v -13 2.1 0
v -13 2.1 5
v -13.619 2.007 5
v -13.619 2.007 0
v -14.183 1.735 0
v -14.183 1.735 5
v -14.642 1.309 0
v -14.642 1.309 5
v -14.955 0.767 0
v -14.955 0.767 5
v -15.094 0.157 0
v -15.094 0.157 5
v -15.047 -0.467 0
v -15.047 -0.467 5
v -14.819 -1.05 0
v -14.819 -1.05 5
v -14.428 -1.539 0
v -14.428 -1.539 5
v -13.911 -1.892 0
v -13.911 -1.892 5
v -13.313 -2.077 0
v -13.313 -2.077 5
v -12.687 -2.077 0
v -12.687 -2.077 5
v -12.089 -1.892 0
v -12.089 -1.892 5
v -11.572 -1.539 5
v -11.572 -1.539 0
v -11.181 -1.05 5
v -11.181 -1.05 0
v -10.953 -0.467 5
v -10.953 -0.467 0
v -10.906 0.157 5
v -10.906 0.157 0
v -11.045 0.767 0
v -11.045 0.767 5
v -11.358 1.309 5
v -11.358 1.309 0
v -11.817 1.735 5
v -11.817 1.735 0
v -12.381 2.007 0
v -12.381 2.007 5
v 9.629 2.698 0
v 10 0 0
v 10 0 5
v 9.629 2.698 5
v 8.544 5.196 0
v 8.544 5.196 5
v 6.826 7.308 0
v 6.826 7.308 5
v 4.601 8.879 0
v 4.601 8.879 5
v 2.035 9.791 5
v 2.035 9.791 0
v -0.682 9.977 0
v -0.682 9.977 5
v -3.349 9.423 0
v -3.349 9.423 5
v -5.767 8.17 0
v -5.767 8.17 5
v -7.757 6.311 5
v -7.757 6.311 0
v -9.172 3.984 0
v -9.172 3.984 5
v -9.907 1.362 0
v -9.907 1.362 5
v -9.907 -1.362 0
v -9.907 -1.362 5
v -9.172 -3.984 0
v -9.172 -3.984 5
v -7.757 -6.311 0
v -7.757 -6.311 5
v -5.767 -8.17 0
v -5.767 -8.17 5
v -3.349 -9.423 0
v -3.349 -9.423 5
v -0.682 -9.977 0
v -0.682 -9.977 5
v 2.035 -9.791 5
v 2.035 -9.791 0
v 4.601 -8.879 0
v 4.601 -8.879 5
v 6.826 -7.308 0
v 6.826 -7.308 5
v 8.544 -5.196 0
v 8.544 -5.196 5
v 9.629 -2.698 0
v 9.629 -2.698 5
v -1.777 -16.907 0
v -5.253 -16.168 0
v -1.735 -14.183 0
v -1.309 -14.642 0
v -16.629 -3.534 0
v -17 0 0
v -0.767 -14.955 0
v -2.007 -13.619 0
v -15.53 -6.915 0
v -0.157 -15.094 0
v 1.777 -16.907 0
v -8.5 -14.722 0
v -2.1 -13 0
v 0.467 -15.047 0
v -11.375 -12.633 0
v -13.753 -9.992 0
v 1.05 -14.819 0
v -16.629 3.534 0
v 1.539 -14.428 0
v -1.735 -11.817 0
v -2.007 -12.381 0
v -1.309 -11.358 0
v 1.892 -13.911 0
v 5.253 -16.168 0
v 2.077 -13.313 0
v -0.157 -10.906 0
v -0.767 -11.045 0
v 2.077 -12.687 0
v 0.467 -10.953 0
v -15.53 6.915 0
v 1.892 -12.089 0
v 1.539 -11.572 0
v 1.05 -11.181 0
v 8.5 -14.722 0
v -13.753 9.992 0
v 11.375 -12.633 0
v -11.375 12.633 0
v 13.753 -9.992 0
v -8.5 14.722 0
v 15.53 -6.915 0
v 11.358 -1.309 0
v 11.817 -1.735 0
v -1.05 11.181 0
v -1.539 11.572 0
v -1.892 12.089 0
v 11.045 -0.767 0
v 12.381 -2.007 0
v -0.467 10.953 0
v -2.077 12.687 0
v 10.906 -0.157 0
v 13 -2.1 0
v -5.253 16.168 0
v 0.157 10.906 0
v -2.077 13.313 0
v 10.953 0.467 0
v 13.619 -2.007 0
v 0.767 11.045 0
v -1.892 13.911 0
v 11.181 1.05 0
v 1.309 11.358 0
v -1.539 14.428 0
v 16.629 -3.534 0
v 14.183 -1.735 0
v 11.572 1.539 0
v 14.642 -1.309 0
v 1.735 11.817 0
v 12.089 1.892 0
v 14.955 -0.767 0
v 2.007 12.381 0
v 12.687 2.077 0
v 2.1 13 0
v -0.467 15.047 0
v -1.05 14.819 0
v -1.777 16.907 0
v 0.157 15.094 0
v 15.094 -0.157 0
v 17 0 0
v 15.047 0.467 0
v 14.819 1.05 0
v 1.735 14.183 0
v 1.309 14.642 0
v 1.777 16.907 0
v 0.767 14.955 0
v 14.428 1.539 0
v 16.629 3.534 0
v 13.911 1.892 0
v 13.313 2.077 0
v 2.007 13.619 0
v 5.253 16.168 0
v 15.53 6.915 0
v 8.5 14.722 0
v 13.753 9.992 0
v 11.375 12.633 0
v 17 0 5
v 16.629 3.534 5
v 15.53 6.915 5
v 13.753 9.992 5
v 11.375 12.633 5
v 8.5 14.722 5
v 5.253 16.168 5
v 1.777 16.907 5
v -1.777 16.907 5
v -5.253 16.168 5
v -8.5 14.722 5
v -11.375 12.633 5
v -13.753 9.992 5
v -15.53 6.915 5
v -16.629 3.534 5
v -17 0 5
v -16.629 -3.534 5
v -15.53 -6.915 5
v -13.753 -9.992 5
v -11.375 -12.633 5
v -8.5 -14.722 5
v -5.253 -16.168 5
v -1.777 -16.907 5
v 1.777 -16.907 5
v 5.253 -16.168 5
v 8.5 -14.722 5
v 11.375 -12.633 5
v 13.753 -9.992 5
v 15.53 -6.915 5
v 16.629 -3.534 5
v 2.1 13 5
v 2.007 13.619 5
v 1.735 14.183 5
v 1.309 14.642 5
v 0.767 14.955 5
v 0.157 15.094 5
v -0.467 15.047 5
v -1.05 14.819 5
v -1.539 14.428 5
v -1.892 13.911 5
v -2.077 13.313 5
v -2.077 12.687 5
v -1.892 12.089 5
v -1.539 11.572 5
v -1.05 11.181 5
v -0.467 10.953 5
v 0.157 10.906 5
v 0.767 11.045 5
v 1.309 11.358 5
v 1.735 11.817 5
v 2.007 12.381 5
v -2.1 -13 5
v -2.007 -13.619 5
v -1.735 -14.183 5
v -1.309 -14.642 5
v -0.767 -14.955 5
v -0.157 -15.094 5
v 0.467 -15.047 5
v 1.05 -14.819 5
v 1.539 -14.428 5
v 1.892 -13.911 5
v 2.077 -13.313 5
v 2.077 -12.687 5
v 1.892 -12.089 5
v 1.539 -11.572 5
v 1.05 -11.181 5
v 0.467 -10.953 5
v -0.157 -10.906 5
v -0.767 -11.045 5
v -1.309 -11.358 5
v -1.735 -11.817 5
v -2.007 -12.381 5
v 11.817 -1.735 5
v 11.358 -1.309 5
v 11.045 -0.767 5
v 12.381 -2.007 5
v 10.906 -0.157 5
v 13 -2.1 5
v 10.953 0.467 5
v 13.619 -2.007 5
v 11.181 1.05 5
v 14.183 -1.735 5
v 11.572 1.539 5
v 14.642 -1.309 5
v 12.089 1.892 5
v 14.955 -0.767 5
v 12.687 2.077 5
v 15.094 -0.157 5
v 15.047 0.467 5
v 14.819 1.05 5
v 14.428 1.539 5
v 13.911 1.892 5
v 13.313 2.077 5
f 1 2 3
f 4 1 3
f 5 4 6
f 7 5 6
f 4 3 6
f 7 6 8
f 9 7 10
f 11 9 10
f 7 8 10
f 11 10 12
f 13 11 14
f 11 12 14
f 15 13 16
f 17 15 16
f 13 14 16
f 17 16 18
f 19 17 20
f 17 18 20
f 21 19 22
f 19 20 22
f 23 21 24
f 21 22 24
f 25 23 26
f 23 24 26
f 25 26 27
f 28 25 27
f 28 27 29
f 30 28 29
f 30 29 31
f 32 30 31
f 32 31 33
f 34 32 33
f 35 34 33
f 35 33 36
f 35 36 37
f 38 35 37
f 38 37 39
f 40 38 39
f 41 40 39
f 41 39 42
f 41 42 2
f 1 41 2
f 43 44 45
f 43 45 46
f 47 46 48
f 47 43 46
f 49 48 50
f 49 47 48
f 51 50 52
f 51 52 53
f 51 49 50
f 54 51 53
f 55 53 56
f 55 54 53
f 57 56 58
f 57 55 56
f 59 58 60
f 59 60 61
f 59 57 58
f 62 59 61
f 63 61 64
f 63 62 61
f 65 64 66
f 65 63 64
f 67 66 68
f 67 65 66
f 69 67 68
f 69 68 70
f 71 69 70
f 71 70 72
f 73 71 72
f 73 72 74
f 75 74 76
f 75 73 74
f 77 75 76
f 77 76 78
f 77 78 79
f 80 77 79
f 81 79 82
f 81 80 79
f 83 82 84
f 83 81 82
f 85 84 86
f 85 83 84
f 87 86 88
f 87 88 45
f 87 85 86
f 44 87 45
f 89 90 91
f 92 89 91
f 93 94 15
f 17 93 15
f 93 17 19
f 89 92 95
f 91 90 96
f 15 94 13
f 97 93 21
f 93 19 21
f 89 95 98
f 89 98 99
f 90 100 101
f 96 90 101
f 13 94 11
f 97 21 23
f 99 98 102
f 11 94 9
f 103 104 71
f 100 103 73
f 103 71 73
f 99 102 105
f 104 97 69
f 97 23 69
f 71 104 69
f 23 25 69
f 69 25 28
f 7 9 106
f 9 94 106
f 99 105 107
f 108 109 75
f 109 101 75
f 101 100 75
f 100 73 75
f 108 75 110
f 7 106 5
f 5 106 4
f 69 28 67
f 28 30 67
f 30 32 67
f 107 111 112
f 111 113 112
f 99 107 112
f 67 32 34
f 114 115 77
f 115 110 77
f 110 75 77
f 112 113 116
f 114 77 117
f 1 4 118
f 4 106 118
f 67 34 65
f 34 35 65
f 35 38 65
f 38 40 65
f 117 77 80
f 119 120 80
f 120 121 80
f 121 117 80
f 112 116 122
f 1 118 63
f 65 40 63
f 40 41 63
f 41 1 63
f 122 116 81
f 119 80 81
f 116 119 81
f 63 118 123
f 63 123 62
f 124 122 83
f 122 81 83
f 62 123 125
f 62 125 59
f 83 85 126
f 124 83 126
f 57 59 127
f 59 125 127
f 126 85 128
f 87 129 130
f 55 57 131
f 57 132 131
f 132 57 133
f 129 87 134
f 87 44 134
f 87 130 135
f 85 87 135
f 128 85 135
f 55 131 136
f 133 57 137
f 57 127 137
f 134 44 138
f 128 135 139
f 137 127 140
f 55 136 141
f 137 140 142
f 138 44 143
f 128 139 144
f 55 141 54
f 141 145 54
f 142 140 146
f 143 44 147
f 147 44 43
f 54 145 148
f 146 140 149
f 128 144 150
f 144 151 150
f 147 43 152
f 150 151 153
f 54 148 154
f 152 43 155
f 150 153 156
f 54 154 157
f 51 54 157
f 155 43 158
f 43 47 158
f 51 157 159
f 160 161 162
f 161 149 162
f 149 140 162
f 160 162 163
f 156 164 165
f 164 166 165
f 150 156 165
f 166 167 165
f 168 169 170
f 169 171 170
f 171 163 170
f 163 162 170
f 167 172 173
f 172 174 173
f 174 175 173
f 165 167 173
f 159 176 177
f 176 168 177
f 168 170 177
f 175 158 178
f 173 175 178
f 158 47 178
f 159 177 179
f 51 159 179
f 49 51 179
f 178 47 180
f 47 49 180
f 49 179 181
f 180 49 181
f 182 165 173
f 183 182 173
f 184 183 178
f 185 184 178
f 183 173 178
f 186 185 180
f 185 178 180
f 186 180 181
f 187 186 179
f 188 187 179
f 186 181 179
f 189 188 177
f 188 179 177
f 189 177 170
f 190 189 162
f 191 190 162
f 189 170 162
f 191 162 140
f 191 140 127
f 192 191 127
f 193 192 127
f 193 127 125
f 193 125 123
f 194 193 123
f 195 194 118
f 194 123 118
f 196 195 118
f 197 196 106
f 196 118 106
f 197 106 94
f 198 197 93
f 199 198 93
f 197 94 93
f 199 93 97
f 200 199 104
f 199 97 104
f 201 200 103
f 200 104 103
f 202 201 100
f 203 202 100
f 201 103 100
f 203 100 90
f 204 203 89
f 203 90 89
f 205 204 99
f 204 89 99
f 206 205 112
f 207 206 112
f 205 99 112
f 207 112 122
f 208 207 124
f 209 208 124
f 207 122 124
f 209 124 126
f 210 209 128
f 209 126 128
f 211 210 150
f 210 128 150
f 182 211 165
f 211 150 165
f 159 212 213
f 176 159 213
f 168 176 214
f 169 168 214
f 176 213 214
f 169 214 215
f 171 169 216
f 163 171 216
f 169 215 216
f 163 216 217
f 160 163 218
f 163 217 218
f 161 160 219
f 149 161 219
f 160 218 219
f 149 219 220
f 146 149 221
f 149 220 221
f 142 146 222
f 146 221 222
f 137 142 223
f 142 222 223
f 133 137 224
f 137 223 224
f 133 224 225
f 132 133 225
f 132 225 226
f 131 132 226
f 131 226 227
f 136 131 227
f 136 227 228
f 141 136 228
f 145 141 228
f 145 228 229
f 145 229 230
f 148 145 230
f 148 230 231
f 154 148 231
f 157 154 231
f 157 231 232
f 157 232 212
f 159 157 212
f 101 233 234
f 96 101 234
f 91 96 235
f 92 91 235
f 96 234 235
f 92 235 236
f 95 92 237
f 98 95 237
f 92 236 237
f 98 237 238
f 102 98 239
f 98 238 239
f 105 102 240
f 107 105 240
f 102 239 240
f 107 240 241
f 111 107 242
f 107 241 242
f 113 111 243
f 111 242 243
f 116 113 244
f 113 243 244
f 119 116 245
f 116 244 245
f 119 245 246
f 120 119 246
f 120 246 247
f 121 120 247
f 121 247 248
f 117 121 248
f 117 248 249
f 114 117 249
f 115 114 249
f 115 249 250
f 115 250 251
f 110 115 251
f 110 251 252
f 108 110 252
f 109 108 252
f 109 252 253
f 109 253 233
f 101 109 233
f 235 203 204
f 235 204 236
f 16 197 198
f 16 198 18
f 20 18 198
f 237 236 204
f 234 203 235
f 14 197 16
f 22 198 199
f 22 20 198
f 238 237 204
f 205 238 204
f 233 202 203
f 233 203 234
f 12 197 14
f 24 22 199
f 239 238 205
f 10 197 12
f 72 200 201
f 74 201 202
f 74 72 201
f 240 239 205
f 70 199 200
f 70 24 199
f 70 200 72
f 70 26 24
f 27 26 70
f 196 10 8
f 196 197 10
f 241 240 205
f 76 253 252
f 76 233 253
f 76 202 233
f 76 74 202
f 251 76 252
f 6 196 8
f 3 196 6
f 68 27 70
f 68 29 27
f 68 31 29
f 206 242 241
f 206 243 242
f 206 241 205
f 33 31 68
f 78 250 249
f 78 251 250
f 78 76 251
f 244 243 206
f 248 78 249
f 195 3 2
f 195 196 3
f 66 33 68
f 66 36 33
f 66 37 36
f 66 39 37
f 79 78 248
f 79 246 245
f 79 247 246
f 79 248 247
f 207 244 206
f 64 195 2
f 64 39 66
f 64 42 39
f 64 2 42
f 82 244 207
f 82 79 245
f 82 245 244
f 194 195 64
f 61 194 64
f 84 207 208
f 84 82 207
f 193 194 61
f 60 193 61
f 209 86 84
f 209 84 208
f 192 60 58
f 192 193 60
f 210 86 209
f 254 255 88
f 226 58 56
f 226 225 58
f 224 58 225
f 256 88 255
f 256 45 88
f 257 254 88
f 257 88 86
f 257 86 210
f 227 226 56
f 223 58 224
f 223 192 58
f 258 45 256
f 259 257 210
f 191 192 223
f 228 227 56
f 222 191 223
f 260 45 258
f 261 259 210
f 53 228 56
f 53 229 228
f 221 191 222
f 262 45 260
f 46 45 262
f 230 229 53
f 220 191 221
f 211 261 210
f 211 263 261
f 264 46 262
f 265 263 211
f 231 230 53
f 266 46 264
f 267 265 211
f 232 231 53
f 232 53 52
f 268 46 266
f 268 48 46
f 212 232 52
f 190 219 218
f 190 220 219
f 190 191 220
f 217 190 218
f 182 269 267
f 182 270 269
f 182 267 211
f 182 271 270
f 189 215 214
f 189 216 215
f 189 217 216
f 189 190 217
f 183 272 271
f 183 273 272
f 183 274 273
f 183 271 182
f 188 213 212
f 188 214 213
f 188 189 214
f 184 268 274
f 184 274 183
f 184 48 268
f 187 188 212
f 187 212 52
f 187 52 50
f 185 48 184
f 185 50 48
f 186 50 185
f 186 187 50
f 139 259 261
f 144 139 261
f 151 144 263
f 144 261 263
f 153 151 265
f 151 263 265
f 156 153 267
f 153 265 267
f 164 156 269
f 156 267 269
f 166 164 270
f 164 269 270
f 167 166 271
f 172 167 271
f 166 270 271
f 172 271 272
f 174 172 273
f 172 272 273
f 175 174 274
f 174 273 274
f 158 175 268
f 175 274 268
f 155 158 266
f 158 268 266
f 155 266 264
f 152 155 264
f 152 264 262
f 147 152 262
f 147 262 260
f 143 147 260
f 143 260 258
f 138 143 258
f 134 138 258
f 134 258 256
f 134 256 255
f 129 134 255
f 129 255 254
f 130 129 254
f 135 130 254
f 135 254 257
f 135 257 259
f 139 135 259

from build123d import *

# Parameters (mm, degrees)
ESQUISSE1_R                  = 17
ESQUISSE1_R_2                = 10
EXTRUSION1_DEPTH             = 5
ESQUISSE2_R                  = 2.1
ENL_V_MAT_EXTRU_1_DEPTH      = 25.556058316
R_P_TITION_CIRCULAIRE1_COUNT = 4


with BuildPart() as part:
    # Esquisse1 → Extrusion1 (new body)
    with BuildSketch(Plane.XY):
        Circle(ESQUISSE1_R)
        Circle(ESQUISSE1_R_2, mode=Mode.SUBTRACT)
    extrude(amount=EXTRUSION1_DEPTH)

    # Esquisse2 → Enlèv. mat.-Extru.1 (cut, through all)
    with BuildSketch(Plane.XY.offset(5)):
        with Locations((0, 13)):
            Circle(ESQUISSE2_R)
    enl_v_mat_extru_1 = extrude(amount=-ENL_V_MAT_EXTRU_1_DEPTH, mode=Mode.SUBTRACT)

    # Répétition circulaire1: Enlèv. mat.-Extru.1 ×4 about axis
    r_p_tition_circulaire1_axis = Axis((0, 0, 5), (0, 0, -1))
    for i in range(1, R_P_TITION_CIRCULAIRE1_COUNT):
        add(enl_v_mat_extru_1.rotate(r_p_tition_circulaire1_axis, i * 360 / R_P_TITION_CIRCULAIRE1_COUNT), mode=Mode.SUBTRACT)


solid = part.part
